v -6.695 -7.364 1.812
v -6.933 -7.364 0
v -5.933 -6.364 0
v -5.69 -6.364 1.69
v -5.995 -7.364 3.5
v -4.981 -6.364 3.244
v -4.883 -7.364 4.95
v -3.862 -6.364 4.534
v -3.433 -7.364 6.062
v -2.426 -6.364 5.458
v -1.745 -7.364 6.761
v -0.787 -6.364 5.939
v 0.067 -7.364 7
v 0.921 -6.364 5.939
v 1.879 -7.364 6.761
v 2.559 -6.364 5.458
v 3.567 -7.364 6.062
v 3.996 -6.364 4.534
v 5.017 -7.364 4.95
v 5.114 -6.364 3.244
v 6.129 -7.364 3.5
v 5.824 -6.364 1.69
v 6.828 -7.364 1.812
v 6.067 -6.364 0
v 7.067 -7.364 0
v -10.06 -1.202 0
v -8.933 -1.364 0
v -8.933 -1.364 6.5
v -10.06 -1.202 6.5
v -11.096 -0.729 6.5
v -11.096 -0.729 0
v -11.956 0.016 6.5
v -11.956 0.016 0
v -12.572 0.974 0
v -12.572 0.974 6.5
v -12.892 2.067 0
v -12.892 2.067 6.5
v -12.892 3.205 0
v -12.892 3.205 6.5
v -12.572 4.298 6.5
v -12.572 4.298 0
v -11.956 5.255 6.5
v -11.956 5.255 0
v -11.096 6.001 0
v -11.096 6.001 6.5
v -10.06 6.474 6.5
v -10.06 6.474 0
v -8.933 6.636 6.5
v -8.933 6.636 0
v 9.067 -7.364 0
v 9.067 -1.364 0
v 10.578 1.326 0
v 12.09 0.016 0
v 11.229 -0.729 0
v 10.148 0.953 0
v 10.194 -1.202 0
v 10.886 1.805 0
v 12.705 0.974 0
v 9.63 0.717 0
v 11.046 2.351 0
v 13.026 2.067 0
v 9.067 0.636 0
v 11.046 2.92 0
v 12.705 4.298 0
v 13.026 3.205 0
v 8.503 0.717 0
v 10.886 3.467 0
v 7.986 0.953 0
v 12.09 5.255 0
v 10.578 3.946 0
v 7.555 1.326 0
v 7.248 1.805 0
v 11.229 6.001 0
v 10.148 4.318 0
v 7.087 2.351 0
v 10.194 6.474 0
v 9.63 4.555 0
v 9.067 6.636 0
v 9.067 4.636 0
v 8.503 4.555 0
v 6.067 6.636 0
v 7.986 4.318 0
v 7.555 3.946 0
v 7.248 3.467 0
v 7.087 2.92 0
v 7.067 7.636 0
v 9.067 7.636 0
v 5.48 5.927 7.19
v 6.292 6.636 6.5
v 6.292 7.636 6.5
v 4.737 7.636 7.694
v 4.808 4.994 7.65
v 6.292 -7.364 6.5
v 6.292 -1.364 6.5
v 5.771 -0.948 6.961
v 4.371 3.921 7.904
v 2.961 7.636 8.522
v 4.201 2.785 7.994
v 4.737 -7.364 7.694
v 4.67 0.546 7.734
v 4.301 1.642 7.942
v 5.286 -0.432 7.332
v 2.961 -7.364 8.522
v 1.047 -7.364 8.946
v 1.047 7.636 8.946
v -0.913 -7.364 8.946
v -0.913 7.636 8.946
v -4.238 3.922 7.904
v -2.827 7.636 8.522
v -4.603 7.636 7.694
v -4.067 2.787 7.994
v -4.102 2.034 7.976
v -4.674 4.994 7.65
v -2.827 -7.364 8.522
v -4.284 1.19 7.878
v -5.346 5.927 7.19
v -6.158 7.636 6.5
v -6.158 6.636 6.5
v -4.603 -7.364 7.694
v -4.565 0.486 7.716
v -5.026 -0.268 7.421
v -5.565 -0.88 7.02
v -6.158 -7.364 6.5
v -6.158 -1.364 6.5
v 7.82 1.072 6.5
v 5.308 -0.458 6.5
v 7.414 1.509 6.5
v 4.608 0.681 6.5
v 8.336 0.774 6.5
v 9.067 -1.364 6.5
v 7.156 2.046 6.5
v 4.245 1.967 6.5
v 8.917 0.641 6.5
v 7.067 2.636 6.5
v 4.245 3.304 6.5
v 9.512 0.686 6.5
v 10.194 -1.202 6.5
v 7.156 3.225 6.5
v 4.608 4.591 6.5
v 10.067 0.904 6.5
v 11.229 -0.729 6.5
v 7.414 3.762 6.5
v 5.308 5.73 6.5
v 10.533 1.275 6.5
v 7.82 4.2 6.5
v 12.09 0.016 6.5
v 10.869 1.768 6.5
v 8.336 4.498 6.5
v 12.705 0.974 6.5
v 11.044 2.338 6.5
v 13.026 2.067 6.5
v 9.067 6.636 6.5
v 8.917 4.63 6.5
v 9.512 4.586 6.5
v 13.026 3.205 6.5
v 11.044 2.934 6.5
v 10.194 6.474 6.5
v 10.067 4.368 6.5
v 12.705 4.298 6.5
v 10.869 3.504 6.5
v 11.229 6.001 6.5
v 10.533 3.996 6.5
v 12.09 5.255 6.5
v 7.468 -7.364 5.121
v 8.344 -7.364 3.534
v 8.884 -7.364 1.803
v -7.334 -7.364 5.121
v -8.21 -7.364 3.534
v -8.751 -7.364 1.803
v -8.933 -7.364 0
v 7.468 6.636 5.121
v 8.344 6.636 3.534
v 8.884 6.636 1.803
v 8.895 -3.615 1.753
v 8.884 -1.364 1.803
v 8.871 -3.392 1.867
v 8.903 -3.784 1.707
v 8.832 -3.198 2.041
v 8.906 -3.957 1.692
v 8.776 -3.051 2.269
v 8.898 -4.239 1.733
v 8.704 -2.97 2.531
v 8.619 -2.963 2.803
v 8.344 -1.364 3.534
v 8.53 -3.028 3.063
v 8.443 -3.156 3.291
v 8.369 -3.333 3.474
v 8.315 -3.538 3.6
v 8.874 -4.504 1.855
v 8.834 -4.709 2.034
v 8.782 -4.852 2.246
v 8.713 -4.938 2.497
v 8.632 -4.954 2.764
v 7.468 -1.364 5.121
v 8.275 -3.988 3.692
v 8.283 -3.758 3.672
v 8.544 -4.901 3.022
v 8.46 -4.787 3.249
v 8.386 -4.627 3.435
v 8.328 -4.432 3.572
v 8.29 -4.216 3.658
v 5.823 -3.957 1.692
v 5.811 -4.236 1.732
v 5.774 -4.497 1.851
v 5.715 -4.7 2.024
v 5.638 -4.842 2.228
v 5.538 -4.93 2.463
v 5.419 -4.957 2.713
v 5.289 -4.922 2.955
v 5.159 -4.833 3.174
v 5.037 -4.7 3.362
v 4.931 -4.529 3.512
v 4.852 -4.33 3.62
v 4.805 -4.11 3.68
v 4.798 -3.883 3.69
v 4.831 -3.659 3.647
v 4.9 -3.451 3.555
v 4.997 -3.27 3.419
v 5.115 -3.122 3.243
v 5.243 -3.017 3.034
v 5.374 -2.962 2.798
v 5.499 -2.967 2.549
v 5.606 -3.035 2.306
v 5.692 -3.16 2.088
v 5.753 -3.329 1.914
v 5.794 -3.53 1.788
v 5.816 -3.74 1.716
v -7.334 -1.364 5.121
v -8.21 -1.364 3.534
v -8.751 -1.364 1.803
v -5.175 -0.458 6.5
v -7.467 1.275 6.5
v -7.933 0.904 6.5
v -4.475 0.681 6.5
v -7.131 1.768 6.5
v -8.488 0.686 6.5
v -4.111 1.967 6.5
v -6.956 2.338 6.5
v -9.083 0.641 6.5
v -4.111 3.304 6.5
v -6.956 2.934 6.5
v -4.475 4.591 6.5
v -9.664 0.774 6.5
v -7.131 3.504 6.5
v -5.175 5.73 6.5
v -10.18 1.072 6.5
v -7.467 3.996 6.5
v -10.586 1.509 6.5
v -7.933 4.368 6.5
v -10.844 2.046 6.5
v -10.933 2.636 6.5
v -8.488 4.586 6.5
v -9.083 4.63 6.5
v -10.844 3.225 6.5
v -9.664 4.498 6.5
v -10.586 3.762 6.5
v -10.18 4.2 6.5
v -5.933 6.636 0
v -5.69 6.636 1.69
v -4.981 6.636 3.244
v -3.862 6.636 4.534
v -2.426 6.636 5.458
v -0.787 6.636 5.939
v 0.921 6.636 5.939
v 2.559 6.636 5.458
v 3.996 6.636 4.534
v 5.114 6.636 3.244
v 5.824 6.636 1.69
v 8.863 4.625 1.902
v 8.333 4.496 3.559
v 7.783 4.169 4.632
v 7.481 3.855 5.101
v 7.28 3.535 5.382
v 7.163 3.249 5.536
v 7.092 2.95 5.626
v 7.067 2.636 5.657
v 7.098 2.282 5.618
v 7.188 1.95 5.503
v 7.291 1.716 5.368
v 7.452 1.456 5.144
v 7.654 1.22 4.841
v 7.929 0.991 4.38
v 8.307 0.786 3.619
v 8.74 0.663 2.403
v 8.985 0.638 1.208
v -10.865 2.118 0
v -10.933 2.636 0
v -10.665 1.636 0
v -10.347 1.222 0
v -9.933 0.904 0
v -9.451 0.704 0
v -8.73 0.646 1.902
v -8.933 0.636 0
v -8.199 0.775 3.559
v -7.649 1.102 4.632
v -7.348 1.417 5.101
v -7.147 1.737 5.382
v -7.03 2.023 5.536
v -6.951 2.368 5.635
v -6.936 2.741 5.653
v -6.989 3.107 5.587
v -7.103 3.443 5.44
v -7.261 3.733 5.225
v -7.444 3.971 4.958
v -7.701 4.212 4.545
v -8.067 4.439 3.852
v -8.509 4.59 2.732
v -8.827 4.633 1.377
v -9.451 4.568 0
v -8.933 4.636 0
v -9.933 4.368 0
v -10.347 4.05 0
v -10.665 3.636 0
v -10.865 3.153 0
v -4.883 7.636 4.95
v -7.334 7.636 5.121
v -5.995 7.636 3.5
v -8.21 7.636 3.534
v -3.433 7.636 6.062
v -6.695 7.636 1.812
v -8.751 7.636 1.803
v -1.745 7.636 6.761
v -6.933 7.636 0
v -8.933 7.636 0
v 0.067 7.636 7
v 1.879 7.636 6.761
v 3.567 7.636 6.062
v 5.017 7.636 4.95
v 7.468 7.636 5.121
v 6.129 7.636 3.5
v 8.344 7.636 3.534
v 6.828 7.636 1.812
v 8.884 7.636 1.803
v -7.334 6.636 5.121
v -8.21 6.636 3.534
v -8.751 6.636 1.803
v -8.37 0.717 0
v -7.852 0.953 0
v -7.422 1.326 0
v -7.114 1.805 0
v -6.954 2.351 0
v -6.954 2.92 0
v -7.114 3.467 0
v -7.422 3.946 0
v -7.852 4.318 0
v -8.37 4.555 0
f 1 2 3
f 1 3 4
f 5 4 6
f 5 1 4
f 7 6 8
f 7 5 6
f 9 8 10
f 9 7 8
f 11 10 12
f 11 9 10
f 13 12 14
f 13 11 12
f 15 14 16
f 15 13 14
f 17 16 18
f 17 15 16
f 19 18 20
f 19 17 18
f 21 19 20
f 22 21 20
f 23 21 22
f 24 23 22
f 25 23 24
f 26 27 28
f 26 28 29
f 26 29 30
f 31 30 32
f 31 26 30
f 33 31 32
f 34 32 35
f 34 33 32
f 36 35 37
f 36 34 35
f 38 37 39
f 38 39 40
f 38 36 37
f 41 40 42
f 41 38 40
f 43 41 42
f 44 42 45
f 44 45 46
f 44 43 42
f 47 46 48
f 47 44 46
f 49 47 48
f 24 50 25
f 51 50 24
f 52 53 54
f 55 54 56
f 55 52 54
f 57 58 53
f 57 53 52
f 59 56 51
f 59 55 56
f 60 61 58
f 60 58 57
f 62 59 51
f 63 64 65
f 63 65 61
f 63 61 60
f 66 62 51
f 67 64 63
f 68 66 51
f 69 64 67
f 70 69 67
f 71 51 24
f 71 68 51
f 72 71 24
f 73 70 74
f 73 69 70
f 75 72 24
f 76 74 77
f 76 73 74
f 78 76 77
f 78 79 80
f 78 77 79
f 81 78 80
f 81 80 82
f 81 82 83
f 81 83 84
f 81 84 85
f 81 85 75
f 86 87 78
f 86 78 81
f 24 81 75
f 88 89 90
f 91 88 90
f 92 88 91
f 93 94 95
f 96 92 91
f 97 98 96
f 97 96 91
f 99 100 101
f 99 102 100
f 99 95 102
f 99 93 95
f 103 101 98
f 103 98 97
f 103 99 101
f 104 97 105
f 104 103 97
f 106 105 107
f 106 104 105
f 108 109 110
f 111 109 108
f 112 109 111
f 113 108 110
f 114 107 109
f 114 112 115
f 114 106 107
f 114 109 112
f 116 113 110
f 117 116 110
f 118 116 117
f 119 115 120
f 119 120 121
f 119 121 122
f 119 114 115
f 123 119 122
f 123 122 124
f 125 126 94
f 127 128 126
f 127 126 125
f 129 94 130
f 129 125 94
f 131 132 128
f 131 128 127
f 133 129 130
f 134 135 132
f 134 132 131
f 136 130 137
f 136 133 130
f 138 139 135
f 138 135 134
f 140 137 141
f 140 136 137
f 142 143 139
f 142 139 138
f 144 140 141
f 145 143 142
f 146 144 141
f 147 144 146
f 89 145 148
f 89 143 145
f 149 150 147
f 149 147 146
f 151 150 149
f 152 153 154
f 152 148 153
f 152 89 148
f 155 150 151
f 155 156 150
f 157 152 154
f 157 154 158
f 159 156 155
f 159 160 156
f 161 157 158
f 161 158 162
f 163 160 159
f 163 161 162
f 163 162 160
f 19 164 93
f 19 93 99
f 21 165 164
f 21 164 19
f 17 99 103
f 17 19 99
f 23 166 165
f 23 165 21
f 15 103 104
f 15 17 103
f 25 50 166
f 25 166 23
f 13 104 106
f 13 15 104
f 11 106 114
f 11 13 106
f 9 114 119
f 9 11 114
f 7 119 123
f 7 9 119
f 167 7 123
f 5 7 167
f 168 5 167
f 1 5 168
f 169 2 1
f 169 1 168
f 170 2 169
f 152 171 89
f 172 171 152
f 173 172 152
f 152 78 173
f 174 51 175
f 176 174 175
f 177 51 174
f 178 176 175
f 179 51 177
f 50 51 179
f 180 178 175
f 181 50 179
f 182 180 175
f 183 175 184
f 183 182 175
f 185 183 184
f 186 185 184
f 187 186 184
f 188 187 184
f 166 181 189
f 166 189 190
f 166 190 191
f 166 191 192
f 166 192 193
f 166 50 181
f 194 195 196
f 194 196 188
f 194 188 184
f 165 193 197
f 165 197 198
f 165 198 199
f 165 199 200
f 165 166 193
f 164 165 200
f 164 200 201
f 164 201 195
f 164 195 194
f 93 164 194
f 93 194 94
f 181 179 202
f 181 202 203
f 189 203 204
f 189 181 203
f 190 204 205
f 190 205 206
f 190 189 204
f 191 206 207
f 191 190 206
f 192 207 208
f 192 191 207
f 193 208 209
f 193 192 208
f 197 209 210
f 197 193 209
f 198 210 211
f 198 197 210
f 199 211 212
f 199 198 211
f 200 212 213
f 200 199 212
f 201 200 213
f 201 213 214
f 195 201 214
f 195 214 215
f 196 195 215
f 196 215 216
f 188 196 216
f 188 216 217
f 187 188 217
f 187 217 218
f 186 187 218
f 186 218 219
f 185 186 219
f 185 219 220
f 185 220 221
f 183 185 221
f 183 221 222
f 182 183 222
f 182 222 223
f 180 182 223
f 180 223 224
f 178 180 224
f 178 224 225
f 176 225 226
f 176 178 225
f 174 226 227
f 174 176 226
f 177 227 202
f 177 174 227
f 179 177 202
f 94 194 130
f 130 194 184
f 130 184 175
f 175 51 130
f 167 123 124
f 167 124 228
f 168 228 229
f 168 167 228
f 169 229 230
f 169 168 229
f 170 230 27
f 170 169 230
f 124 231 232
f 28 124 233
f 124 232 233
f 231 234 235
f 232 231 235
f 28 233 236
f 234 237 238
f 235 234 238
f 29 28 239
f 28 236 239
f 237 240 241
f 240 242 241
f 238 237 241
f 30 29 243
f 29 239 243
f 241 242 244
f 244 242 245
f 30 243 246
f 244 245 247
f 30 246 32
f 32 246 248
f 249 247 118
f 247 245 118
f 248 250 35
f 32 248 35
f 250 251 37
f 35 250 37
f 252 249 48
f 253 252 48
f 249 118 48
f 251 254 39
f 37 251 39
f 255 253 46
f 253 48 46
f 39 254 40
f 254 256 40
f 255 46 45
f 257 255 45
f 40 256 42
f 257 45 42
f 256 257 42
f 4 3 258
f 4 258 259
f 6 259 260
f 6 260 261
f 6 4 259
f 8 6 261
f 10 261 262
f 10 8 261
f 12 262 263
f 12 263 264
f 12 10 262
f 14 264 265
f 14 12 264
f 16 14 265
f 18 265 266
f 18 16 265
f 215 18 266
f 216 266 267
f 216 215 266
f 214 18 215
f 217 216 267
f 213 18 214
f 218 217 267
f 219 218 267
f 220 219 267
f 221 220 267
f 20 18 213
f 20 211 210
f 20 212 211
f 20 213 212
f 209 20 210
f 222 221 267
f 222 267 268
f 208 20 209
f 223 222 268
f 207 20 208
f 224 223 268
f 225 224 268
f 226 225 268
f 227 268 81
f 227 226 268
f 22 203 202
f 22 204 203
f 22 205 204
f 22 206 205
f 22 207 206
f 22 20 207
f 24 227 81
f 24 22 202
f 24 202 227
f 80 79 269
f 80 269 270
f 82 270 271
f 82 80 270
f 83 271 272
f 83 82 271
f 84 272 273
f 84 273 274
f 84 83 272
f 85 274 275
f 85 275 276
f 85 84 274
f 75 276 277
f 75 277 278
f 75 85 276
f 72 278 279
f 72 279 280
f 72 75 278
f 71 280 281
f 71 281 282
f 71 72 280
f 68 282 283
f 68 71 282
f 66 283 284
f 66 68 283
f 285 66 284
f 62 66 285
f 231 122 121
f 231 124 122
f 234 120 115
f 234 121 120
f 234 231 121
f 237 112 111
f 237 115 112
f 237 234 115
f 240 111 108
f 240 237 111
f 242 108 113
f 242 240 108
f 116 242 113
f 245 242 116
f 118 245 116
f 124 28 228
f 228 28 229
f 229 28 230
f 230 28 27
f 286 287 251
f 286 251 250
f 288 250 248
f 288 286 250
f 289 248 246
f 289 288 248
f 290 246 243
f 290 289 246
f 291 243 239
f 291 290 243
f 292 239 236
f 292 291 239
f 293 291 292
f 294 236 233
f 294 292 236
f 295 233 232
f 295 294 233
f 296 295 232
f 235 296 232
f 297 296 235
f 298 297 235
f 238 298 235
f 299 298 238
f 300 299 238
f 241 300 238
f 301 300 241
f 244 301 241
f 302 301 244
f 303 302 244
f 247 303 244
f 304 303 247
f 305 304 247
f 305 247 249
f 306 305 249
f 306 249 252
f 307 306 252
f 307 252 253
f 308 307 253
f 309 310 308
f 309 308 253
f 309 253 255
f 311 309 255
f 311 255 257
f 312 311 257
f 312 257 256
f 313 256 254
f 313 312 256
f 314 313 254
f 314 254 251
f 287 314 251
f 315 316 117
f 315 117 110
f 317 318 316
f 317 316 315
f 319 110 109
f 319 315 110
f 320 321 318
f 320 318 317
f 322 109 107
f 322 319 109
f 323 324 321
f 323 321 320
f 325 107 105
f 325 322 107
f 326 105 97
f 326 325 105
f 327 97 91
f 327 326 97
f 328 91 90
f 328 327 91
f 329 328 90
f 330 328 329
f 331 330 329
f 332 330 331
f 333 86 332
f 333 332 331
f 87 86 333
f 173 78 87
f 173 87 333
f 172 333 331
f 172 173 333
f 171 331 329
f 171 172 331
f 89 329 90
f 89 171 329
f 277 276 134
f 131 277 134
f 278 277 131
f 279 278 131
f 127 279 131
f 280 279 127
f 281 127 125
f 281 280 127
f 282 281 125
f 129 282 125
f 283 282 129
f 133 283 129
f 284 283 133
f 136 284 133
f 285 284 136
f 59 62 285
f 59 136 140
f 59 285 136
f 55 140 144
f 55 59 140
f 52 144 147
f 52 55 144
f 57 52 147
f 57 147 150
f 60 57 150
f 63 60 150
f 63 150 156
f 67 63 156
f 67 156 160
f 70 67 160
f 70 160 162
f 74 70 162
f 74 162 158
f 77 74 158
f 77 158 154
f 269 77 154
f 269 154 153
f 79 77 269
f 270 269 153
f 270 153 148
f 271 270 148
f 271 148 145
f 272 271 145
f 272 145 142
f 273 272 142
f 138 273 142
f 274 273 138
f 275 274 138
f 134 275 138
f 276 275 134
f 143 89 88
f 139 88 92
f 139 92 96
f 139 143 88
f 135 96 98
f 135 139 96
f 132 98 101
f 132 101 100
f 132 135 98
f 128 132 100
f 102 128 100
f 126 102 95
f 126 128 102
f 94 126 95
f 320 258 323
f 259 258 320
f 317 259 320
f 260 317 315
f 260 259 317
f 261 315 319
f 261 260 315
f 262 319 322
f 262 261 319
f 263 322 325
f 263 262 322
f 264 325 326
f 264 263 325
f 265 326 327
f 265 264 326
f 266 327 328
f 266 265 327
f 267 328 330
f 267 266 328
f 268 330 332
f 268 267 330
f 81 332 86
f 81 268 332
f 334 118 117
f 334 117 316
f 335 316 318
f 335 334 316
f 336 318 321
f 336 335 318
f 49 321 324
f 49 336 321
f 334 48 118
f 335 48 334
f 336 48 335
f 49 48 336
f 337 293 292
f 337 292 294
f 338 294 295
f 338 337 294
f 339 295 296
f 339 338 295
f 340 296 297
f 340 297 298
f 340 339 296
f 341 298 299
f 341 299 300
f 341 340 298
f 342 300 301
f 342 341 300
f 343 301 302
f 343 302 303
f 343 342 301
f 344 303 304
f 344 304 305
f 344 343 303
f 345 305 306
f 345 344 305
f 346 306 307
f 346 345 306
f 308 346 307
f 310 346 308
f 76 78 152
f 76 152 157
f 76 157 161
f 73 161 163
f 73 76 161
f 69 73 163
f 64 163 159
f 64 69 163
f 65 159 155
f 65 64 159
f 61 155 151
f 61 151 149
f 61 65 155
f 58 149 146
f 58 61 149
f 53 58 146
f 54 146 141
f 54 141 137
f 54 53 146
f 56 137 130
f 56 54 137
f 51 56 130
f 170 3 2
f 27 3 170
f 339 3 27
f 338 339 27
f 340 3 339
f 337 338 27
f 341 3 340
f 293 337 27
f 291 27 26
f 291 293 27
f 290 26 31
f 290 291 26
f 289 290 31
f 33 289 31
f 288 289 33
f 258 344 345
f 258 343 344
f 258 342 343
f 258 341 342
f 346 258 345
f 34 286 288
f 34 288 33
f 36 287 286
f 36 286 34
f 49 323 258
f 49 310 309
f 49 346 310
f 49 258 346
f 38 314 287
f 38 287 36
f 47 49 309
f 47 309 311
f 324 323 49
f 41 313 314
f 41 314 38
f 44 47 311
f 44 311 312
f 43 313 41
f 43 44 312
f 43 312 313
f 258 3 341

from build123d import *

# Parameters (mm, degrees)
CROQUIS2_R                 = 2
SALIENTE_EXTRUIR1_DEPTH    = 6.5
SALIENTE_EXTRUIR1_2_DEPTH  = 6.5
SALIENTE_EXTRUIR2_DEPTH    = 15
CORTAR_EXTRUIR3_START      = -7
CROQUIS7_R                 = 2
CORTAR_EXTRUIR3_DEPTH      = 7
CORTAR_EXTRUIR5_START      = -7.364158067
CORTAR_EXTRUIR5_DEPTH      = 6
CORTAR_EXTRUIR5_START_2    = 6.635841933
CORTAR_EXTRUIR5_2_DEPTH    = 1
CROQUIS13_R                = 4.868357384
CORTAR_EXTRUIR6_DEPTH      = 4
CHAFL_N1_SIZE              = 1
CORTAR_EXTRUIR7_REACH      = 26.966
CORTAR_EXTRUIR7_END_RADIUS = 6
CROQUIS14_R                = 1


# Read off the part's stored shape, not the designer's step: Cortar-Extruir5
with BuildPart() as part:
    # Croquis2 → Saliente-Extruir1 (new body)
    with BuildSketch(Plane.XY):
        with BuildLine():
            ThreePointArc((-8.933187638, -1.364158067), (-12.933187638, 2.635841933), (-8.933187638, 6.635841933))
            Line((-8.933187638, 6.635841933), (-8.933187638, 7.635841933))
            Line((-8.933187638, 7.635841933), (-5.933187638, 7.635841933))
            Line((-5.933187638, 7.635841933), (-5.933187638, -7.364158067))
            Line((-5.933187638, -7.364158067), (-8.933187638, -7.364158067))
            Line((-8.933187638, -7.364158067), (-8.933187638, -1.364158067))
        make_face()
        with Locations(Location((-8.933187638, 2.635841933, 0), (0, 0, 180))):
            Circle(CROQUIS2_R, mode=Mode.SUBTRACT)
    extrude(amount=SALIENTE_EXTRUIR1_DEPTH)



with BuildPart() as body_2:
    # Croquis2 → Saliente-Extruir1 2 (new body)
    with BuildSketch(Plane.XY):
        with BuildLine():
            Line((9.066812362, -1.364158067), (9.066812362, -7.364158067))
            Line((9.066812362, -7.364158067), (6.066812362, -7.364158067))
            Line((6.066812362, -7.364158067), (6.066812362, 7.635841933))
            Line((6.066812362, 7.635841933), (9.066812362, 7.635841933))
            Line((9.066812362, 7.635841933), (9.066812362, 6.635841933))
            ThreePointArc((9.066812362, 6.635841933), (13.066812362, 2.635841933), (9.066812362, -1.364158067))
        make_face()
        with Locations(Location((9.066812362, 2.635841933, 0), (0, 0, 180))):
            Circle(CROQUIS2_R, mode=Mode.SUBTRACT)
    extrude(amount=SALIENTE_EXTRUIR1_2_DEPTH)


with BuildPart() as part_1:
    add(part.part)

    add(body_2.part)  # Saliente-Extruir2 merges body 2
    # Croquis3 → Saliente-Extruir2 (add, through all)
    with BuildSketch(Plane.XZ.offset(7.364158067)):
        with BuildLine():
            Line((-8.933187638, 0), (-5.933187638, 0))
            ThreePointArc((-5.933187638, 0), (0.066812362, 6), (6.066812362, 0))
            Line((6.066812362, 0), (9.066812362, 0))
            ThreePointArc((9.066812362, 0), (0.066812362, 9), (-8.933187638, 0))
        make_face()
    extrude(amount=-SALIENTE_EXTRUIR2_DEPTH)

    # Croquis7 → Cortar-Extruir3 (cut)
    with BuildSketch(Plane.XY.offset(6.5).offset(CORTAR_EXTRUIR3_START)):
        with Locations(Location((9.066812362, 2.635841933, 0), (0, 0, 180))):
            Circle(CROQUIS7_R)
        with Locations(Location((-8.933187638, 2.635841933, 0), (0, 0, 180))):
            Circle(CROQUIS7_R)
    extrude(amount=CORTAR_EXTRUIR3_DEPTH, mode=Mode.SUBTRACT)

    # Cortar-Extruir5 outline → Cortar-Extruir5 (cut)
    with BuildSketch(Plane(origin=(0, 0, 0), x_dir=(1, 0, 0), z_dir=(0, 1, 0)).offset(CORTAR_EXTRUIR5_START)):
        with BuildLine():
            Line((9.066812362, -6.5), (9.066812362, 0))
            ThreePointArc((9.066812362, 0), (8.344026513, -3.53379766), (6.291762161, -6.5))
            Line((6.291762161, -6.5), (9.066812362, -6.5))
        make_face()
        with BuildLine():
            Line((-8.933187638, -6.5), (-6.158137437, -6.5))
            ThreePointArc((-6.158137437, -6.5), (-8.210401789, -3.53379766), (-8.933187638, 0))
            Line((-8.933187638, 0), (-8.933187638, -6.5))
        make_face()
    extrude(amount=CORTAR_EXTRUIR5_DEPTH, mode=Mode.SUBTRACT)

    # Cortar-Extruir5 2 outline → Cortar-Extruir5 2 (cut)
    with BuildSketch(Plane(origin=(0, 0, 0), x_dir=(1, 0, 0), z_dir=(0, 1, 0)).offset(CORTAR_EXTRUIR5_START_2)):
        with BuildLine():
            Line((9.066812362, -6.5), (9.066812362, 0))
            ThreePointArc((9.066812362, 0), (8.344026513, -3.53379766), (6.291762161, -6.5))
            Line((6.291762161, -6.5), (9.066812362, -6.5))
        make_face()
        with BuildLine():
            Line((-8.933187638, -6.5), (-6.158137437, -6.5))
            ThreePointArc((-6.158137437, -6.5), (-8.210401789, -3.53379766), (-8.933187638, 0))
            Line((-8.933187638, 0), (-8.933187638, -6.5))
        make_face()
    extrude(amount=CORTAR_EXTRUIR5_2_DEPTH, mode=Mode.SUBTRACT)

    # Croquis13 → Cortar-Extruir6 (cut)
    with BuildSketch(Plane.XY.offset(6.5)):
        with Locations((9.066812362, 2.635841933)):
            Circle(CROQUIS13_R)
        with Locations((-8.933187638, 2.635841933)):
            Circle(CROQUIS13_R)
    extrude(amount=CORTAR_EXTRUIR6_DEPTH, mode=Mode.SUBTRACT)

    # Chaflán1
    chafl_n1_edges = [part_1.edges().sort_by_distance(p)[0] for p in [
        (0.066812362, 7.635841933, 6),
        (0.066812362, -7.364158067, 6),
    ]]
    chamfer(chafl_n1_edges, length=CHAFL_N1_SIZE)

    # Cortar-Extruir7: up to this cylinder (the profile starts outside it)
    cortar_extruir7_end = Plane(origin=(0.066812362, -3.95674, 0), z_dir=(0, -1, 0)) * Cylinder(CORTAR_EXTRUIR7_END_RADIUS, 66.932, mode=Mode.PRIVATE)
    # Croquis14 → Cortar-Extruir7 (cut, up to the surface)
    with BuildSketch(Plane(origin=(9.066812362, 0, 0), x_dir=(0, -1, 0), z_dir=(-1, 0, 0)), mode=Mode.PRIVATE) as cortar_extruir7_sk1:
        with Locations(Location((3.956739881, 2.692300291, 0), (0, 0, 270))):
            Circle(CROQUIS14_R)
    cortar_extruir7_tool1 = extrude(cortar_extruir7_sk1.sketch, amount=CORTAR_EXTRUIR7_REACH, mode=Mode.PRIVATE) - cortar_extruir7_end
    add(cortar_extruir7_tool1.solids().sort_by_distance((9.066812, -3.95674, 2.6923))[0], mode=Mode.SUBTRACT)


solid = part_1.part
